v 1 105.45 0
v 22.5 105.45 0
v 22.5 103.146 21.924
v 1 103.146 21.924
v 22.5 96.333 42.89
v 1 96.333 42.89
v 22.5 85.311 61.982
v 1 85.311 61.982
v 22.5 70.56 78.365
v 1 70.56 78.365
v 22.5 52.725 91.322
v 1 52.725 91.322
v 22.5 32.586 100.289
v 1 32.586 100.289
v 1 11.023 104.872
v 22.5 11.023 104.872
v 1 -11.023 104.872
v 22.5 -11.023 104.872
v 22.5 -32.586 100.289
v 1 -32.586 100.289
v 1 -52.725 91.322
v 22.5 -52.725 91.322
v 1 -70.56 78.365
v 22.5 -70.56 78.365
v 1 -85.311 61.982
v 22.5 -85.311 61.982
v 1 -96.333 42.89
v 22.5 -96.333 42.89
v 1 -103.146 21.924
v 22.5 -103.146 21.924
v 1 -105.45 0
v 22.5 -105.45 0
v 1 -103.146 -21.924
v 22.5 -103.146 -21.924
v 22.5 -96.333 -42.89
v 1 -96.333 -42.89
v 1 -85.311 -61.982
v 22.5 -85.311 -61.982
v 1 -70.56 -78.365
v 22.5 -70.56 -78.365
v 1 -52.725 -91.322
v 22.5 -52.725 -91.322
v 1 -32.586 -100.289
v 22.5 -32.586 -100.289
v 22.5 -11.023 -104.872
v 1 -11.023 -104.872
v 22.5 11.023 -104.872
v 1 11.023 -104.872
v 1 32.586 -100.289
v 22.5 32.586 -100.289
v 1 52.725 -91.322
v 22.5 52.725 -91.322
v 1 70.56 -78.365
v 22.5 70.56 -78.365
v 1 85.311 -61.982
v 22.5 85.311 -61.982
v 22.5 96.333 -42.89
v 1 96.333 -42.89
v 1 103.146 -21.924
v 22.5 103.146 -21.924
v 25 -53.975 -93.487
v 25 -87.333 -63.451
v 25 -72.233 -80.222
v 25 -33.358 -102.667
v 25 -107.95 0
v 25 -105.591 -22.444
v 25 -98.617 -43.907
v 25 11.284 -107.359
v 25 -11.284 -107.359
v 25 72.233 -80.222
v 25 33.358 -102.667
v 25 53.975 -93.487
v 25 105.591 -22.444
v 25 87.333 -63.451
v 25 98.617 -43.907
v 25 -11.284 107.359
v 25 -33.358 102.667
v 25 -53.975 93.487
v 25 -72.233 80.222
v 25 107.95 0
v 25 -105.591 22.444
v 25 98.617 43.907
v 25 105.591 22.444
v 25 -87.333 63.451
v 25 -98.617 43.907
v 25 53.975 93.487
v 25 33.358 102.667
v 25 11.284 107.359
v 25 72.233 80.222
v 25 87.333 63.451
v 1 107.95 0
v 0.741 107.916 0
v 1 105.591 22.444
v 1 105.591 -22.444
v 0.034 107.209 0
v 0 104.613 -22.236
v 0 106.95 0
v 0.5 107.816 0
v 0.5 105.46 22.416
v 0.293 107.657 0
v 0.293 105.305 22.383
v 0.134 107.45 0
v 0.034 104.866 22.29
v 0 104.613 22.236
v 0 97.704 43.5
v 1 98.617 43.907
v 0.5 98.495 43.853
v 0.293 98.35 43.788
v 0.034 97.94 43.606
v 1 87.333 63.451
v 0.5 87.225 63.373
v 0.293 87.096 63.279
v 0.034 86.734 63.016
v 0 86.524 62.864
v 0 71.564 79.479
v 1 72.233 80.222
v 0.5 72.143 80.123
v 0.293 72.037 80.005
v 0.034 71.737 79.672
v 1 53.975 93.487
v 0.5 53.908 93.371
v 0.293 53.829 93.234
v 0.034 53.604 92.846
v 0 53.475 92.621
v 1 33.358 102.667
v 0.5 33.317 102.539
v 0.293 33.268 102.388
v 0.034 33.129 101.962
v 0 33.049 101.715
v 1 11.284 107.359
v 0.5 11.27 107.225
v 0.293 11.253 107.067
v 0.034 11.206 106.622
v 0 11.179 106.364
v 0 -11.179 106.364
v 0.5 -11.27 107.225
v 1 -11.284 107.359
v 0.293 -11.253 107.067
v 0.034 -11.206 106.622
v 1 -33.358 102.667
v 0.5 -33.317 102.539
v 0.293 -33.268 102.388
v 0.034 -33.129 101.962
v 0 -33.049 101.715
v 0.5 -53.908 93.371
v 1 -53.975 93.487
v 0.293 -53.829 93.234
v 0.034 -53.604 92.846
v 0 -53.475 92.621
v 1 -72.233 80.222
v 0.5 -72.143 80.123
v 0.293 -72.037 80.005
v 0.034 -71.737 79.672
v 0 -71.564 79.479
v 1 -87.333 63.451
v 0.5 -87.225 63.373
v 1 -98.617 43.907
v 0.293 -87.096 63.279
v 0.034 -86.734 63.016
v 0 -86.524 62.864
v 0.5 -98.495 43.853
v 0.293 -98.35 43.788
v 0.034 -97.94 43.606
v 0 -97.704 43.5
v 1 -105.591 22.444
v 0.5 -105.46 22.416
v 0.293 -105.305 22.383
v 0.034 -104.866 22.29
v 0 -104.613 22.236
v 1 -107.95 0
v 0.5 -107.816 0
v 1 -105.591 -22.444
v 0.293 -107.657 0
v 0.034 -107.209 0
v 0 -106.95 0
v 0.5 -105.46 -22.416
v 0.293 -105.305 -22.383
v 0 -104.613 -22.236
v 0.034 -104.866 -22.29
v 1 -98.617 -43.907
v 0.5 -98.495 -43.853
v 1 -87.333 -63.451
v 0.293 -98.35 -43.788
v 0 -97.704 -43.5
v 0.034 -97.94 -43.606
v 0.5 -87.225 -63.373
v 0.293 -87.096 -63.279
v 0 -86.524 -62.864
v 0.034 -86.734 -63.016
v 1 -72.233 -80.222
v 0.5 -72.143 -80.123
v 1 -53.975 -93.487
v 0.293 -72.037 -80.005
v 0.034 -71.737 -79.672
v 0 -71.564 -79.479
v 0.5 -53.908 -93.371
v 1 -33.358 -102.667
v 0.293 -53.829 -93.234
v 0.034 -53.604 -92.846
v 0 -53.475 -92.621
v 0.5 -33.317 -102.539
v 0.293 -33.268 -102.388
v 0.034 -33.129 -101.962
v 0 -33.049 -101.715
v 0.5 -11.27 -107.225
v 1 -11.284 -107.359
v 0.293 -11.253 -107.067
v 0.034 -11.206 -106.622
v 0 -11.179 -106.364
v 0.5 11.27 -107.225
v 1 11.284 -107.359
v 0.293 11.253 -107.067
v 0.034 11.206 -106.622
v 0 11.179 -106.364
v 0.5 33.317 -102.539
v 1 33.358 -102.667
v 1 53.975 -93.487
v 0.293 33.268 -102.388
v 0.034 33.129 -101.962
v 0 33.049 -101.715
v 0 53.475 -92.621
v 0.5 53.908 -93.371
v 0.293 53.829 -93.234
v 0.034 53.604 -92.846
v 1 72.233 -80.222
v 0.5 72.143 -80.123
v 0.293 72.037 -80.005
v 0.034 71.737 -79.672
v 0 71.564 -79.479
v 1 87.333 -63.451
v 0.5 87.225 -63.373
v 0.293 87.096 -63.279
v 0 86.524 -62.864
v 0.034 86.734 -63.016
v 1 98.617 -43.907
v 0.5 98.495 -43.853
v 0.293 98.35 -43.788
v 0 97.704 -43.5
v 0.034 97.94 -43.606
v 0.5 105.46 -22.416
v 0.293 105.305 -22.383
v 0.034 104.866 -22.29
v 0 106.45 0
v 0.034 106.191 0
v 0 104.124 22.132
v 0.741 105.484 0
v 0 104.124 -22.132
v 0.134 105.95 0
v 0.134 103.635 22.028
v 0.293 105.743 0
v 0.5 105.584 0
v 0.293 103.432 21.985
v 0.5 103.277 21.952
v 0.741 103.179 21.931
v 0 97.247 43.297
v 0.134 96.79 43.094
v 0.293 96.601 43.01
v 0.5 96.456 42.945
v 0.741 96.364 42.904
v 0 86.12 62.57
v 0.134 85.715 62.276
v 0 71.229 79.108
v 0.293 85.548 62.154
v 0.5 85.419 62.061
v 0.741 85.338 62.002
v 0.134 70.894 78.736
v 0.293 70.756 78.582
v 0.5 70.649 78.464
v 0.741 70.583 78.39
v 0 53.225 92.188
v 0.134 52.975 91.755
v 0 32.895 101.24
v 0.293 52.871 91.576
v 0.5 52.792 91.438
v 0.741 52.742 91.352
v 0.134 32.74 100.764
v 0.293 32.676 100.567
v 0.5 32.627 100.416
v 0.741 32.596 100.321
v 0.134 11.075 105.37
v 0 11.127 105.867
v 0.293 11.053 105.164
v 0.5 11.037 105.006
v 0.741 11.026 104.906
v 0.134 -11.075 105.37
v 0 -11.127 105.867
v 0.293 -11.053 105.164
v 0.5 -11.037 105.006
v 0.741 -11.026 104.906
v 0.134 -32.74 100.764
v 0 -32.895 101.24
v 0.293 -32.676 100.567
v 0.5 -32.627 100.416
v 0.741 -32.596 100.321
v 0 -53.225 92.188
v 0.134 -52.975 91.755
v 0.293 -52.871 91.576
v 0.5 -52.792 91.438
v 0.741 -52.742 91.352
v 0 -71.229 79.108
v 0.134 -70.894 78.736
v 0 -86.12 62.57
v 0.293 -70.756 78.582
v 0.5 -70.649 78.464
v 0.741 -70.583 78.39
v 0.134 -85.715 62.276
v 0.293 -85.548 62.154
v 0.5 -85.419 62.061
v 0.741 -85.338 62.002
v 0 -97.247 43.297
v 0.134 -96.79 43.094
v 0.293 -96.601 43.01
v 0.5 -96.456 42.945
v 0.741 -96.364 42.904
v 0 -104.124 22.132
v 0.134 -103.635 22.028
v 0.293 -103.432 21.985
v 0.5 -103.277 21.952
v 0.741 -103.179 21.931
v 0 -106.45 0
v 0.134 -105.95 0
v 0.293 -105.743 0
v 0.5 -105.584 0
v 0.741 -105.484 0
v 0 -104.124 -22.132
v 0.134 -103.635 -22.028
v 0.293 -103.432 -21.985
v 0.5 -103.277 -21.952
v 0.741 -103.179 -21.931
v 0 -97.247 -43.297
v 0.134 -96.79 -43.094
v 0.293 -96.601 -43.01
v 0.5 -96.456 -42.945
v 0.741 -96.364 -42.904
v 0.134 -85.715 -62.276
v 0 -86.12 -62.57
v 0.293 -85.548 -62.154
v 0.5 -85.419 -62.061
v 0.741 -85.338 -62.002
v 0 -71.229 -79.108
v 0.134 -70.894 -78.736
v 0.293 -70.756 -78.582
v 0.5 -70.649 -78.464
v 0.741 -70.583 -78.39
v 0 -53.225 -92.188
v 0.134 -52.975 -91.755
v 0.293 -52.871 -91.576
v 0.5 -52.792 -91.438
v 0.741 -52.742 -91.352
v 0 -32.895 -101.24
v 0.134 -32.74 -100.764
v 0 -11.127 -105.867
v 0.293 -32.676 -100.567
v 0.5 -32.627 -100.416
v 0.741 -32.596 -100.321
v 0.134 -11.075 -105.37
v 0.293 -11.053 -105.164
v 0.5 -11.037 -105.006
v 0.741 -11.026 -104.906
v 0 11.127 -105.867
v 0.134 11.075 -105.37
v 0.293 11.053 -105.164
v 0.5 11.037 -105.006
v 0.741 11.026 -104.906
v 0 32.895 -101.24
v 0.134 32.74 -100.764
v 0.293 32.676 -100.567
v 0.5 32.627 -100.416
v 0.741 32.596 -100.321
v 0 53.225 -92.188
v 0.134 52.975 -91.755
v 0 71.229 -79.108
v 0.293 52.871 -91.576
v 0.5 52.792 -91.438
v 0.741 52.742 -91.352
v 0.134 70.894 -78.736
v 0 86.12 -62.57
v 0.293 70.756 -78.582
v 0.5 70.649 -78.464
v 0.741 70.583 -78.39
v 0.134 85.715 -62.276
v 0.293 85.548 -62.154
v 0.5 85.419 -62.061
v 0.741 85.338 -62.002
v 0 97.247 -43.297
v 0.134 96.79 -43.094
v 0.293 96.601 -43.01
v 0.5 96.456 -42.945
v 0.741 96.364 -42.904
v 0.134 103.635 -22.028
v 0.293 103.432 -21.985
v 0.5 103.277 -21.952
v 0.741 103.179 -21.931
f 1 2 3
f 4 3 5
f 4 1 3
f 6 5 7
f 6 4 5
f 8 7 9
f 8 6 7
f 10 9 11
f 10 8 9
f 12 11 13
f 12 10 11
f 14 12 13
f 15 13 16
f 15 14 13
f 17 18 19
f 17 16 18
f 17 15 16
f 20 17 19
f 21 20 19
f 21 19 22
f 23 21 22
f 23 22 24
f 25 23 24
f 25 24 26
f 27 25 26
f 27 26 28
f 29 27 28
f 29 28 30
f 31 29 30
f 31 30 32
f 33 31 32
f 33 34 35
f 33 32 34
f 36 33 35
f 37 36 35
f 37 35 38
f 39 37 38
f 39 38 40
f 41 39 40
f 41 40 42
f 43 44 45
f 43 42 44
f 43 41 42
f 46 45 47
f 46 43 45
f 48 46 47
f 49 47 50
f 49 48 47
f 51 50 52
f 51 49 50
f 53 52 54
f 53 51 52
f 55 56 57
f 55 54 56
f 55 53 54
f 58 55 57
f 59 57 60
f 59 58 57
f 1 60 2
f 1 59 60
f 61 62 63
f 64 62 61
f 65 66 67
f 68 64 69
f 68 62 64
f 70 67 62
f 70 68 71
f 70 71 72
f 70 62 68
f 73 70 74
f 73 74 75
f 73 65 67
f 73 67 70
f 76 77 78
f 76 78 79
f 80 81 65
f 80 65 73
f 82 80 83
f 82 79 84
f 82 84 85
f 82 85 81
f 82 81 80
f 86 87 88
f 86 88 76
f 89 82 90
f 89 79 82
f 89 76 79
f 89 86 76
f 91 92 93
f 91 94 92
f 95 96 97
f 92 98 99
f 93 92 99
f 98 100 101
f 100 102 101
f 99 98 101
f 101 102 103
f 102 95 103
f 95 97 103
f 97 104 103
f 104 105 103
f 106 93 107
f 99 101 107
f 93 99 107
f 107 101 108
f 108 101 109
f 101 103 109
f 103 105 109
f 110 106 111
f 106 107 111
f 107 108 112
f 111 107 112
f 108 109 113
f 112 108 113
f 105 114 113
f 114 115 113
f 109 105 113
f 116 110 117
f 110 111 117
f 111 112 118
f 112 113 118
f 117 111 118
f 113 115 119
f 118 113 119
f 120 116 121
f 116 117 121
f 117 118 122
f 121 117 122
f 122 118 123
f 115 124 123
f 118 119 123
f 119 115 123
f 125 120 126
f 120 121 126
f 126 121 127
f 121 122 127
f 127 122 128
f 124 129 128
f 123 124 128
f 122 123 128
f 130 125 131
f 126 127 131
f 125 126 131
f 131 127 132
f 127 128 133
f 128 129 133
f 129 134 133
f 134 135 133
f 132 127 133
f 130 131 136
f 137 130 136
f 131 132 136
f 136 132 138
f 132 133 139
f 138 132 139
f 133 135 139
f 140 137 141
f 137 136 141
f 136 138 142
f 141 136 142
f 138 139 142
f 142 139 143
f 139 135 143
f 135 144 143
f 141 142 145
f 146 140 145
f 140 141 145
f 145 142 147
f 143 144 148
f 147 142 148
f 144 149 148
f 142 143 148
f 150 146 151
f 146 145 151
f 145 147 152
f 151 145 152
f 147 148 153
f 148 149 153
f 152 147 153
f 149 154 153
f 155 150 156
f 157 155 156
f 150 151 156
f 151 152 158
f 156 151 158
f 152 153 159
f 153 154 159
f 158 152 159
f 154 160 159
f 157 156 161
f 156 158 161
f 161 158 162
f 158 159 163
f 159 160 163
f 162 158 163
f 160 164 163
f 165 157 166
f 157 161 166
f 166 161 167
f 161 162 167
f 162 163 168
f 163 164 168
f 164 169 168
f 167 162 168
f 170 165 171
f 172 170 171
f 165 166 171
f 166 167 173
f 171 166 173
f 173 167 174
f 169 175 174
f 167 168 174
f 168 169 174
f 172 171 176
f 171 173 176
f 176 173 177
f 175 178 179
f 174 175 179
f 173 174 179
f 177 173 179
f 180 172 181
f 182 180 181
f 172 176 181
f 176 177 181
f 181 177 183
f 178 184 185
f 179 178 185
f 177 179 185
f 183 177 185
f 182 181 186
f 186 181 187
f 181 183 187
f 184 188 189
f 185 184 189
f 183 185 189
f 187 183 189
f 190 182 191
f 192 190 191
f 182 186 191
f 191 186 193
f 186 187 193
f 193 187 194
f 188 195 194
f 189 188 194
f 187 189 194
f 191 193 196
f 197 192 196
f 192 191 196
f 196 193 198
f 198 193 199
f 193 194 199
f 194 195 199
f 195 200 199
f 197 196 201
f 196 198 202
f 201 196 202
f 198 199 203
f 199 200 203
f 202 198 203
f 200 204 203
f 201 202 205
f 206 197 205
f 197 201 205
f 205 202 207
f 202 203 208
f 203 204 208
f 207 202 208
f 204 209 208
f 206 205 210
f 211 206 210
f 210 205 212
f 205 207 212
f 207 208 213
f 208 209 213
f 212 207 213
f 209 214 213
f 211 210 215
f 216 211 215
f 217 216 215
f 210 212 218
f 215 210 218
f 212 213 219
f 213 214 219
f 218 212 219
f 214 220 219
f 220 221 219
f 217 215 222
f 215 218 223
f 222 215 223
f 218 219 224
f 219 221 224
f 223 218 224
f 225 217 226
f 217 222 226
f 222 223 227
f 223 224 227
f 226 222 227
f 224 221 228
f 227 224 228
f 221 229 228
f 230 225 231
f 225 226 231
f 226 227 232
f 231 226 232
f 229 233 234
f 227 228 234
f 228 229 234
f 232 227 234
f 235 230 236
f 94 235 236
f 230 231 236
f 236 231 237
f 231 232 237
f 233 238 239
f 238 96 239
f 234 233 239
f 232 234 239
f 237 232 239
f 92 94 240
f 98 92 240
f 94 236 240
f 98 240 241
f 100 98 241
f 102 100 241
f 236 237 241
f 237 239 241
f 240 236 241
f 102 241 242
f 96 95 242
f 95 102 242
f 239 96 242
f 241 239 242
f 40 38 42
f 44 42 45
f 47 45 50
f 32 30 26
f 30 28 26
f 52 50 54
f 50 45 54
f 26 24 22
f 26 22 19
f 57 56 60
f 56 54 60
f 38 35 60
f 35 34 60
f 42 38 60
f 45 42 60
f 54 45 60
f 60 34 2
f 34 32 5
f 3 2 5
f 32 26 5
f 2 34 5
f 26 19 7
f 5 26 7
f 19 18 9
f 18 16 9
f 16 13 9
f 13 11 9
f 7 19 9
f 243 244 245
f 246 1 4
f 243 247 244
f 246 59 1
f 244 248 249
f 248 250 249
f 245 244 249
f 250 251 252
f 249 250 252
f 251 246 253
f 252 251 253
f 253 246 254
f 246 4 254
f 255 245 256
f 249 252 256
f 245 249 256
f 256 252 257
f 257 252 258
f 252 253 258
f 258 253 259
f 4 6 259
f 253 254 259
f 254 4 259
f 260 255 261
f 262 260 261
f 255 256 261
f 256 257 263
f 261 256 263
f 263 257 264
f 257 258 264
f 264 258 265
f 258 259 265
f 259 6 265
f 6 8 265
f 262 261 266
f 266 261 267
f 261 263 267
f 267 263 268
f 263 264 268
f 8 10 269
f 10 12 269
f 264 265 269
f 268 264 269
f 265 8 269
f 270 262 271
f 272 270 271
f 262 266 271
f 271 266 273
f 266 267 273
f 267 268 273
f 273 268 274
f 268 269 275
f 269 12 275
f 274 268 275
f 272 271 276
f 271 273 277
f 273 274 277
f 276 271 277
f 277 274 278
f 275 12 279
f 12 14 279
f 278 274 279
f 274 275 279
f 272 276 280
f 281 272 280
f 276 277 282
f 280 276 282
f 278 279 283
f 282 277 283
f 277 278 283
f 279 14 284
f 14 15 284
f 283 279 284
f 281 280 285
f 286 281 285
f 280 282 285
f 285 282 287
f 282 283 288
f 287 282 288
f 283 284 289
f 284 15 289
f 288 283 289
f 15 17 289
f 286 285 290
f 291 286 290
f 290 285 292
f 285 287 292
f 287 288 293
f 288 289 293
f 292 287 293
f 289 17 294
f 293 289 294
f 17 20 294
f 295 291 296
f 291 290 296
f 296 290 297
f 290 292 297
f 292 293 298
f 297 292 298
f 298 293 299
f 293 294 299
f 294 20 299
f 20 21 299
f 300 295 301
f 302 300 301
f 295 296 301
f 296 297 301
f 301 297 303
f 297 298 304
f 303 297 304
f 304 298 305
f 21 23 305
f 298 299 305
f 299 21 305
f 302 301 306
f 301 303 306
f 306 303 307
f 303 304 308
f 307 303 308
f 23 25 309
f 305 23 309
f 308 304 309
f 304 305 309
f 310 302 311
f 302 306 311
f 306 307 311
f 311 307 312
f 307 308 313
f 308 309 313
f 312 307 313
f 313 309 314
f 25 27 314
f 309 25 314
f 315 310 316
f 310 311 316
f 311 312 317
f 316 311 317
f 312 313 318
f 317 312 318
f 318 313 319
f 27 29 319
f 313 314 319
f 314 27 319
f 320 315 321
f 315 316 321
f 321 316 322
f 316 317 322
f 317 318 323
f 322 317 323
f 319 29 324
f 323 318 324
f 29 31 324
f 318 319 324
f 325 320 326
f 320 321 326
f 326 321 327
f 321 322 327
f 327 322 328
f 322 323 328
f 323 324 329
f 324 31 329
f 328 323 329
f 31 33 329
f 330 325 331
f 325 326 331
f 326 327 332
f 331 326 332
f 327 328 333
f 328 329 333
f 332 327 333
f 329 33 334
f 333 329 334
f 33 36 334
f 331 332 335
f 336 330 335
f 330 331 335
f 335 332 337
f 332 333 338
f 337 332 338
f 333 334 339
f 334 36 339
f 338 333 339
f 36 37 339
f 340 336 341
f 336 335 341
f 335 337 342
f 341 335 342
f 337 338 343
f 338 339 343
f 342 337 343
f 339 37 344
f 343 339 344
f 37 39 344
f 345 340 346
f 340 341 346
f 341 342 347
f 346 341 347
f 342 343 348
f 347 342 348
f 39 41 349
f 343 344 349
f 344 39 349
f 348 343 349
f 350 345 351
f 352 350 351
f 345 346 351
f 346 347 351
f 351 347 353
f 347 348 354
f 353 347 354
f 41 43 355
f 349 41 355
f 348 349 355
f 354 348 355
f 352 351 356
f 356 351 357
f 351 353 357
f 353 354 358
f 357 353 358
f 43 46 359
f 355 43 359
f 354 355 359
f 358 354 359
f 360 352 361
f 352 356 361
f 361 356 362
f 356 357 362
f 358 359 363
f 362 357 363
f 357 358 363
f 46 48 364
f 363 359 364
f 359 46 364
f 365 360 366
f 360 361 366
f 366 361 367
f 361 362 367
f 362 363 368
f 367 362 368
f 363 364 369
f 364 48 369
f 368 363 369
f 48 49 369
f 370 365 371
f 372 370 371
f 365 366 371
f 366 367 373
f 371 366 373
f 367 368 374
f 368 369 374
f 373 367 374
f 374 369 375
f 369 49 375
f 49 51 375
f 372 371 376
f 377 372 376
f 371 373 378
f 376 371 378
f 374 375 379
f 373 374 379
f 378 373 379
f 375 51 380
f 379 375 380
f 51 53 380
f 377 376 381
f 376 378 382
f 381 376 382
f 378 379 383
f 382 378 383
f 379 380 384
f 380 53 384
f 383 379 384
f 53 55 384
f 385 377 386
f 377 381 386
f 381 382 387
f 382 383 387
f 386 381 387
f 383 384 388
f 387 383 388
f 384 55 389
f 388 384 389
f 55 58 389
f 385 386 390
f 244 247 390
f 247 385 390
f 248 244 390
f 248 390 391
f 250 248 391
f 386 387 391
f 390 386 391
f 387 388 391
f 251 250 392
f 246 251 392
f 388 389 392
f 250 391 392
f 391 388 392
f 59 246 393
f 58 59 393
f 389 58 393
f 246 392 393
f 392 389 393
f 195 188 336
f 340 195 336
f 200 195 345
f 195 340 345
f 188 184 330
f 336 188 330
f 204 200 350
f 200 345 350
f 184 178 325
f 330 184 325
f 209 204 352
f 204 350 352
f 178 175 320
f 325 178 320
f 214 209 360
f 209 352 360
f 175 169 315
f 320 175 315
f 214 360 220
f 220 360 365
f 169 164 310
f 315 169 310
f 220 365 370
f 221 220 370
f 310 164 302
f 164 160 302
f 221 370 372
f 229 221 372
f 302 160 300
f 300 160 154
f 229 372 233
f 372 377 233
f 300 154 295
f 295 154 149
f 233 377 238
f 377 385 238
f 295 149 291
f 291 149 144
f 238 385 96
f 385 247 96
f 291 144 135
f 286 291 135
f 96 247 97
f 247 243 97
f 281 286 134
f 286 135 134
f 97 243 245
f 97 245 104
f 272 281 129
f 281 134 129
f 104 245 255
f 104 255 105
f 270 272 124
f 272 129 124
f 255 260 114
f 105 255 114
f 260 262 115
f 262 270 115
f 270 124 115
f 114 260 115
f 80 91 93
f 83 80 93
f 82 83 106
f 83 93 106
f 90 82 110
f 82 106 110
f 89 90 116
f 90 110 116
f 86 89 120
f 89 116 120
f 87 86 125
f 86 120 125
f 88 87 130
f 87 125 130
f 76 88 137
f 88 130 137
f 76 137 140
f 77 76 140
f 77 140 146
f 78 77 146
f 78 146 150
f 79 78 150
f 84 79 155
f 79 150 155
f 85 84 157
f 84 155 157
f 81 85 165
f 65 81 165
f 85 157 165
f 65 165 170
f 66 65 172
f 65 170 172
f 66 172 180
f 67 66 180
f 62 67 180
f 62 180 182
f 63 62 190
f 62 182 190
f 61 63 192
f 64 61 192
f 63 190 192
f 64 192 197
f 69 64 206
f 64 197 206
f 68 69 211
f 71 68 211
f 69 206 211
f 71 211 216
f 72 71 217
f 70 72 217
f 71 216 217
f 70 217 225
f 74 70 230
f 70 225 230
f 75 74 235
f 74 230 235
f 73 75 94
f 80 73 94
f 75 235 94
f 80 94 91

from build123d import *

# Parameters (mm, degrees)
F0_R     = 107.95
F1_DEPTH = 25
F2_T     = -2.5
F3_R     = 1


with BuildPart() as f1:
    # F0 (on Right) → F1 (new body)
    with BuildSketch(Plane.YZ):
        Circle(F0_R)
    extrude(amount=F1_DEPTH)

    # F2
    f2_openings = [f1.faces().sort_by_distance(p)[0] for p in [
        (0, 0, 0),
    ]]
    offset(amount=F2_T, openings=f2_openings)

    # F3
    f3_edges = [f1.edges().sort_by_distance(p)[0] for p in [
        (0, -107.95, 0),
        (0, -105.45, 0),
    ]]
    fillet(f3_edges, radius=F3_R)


solid = f1.part
